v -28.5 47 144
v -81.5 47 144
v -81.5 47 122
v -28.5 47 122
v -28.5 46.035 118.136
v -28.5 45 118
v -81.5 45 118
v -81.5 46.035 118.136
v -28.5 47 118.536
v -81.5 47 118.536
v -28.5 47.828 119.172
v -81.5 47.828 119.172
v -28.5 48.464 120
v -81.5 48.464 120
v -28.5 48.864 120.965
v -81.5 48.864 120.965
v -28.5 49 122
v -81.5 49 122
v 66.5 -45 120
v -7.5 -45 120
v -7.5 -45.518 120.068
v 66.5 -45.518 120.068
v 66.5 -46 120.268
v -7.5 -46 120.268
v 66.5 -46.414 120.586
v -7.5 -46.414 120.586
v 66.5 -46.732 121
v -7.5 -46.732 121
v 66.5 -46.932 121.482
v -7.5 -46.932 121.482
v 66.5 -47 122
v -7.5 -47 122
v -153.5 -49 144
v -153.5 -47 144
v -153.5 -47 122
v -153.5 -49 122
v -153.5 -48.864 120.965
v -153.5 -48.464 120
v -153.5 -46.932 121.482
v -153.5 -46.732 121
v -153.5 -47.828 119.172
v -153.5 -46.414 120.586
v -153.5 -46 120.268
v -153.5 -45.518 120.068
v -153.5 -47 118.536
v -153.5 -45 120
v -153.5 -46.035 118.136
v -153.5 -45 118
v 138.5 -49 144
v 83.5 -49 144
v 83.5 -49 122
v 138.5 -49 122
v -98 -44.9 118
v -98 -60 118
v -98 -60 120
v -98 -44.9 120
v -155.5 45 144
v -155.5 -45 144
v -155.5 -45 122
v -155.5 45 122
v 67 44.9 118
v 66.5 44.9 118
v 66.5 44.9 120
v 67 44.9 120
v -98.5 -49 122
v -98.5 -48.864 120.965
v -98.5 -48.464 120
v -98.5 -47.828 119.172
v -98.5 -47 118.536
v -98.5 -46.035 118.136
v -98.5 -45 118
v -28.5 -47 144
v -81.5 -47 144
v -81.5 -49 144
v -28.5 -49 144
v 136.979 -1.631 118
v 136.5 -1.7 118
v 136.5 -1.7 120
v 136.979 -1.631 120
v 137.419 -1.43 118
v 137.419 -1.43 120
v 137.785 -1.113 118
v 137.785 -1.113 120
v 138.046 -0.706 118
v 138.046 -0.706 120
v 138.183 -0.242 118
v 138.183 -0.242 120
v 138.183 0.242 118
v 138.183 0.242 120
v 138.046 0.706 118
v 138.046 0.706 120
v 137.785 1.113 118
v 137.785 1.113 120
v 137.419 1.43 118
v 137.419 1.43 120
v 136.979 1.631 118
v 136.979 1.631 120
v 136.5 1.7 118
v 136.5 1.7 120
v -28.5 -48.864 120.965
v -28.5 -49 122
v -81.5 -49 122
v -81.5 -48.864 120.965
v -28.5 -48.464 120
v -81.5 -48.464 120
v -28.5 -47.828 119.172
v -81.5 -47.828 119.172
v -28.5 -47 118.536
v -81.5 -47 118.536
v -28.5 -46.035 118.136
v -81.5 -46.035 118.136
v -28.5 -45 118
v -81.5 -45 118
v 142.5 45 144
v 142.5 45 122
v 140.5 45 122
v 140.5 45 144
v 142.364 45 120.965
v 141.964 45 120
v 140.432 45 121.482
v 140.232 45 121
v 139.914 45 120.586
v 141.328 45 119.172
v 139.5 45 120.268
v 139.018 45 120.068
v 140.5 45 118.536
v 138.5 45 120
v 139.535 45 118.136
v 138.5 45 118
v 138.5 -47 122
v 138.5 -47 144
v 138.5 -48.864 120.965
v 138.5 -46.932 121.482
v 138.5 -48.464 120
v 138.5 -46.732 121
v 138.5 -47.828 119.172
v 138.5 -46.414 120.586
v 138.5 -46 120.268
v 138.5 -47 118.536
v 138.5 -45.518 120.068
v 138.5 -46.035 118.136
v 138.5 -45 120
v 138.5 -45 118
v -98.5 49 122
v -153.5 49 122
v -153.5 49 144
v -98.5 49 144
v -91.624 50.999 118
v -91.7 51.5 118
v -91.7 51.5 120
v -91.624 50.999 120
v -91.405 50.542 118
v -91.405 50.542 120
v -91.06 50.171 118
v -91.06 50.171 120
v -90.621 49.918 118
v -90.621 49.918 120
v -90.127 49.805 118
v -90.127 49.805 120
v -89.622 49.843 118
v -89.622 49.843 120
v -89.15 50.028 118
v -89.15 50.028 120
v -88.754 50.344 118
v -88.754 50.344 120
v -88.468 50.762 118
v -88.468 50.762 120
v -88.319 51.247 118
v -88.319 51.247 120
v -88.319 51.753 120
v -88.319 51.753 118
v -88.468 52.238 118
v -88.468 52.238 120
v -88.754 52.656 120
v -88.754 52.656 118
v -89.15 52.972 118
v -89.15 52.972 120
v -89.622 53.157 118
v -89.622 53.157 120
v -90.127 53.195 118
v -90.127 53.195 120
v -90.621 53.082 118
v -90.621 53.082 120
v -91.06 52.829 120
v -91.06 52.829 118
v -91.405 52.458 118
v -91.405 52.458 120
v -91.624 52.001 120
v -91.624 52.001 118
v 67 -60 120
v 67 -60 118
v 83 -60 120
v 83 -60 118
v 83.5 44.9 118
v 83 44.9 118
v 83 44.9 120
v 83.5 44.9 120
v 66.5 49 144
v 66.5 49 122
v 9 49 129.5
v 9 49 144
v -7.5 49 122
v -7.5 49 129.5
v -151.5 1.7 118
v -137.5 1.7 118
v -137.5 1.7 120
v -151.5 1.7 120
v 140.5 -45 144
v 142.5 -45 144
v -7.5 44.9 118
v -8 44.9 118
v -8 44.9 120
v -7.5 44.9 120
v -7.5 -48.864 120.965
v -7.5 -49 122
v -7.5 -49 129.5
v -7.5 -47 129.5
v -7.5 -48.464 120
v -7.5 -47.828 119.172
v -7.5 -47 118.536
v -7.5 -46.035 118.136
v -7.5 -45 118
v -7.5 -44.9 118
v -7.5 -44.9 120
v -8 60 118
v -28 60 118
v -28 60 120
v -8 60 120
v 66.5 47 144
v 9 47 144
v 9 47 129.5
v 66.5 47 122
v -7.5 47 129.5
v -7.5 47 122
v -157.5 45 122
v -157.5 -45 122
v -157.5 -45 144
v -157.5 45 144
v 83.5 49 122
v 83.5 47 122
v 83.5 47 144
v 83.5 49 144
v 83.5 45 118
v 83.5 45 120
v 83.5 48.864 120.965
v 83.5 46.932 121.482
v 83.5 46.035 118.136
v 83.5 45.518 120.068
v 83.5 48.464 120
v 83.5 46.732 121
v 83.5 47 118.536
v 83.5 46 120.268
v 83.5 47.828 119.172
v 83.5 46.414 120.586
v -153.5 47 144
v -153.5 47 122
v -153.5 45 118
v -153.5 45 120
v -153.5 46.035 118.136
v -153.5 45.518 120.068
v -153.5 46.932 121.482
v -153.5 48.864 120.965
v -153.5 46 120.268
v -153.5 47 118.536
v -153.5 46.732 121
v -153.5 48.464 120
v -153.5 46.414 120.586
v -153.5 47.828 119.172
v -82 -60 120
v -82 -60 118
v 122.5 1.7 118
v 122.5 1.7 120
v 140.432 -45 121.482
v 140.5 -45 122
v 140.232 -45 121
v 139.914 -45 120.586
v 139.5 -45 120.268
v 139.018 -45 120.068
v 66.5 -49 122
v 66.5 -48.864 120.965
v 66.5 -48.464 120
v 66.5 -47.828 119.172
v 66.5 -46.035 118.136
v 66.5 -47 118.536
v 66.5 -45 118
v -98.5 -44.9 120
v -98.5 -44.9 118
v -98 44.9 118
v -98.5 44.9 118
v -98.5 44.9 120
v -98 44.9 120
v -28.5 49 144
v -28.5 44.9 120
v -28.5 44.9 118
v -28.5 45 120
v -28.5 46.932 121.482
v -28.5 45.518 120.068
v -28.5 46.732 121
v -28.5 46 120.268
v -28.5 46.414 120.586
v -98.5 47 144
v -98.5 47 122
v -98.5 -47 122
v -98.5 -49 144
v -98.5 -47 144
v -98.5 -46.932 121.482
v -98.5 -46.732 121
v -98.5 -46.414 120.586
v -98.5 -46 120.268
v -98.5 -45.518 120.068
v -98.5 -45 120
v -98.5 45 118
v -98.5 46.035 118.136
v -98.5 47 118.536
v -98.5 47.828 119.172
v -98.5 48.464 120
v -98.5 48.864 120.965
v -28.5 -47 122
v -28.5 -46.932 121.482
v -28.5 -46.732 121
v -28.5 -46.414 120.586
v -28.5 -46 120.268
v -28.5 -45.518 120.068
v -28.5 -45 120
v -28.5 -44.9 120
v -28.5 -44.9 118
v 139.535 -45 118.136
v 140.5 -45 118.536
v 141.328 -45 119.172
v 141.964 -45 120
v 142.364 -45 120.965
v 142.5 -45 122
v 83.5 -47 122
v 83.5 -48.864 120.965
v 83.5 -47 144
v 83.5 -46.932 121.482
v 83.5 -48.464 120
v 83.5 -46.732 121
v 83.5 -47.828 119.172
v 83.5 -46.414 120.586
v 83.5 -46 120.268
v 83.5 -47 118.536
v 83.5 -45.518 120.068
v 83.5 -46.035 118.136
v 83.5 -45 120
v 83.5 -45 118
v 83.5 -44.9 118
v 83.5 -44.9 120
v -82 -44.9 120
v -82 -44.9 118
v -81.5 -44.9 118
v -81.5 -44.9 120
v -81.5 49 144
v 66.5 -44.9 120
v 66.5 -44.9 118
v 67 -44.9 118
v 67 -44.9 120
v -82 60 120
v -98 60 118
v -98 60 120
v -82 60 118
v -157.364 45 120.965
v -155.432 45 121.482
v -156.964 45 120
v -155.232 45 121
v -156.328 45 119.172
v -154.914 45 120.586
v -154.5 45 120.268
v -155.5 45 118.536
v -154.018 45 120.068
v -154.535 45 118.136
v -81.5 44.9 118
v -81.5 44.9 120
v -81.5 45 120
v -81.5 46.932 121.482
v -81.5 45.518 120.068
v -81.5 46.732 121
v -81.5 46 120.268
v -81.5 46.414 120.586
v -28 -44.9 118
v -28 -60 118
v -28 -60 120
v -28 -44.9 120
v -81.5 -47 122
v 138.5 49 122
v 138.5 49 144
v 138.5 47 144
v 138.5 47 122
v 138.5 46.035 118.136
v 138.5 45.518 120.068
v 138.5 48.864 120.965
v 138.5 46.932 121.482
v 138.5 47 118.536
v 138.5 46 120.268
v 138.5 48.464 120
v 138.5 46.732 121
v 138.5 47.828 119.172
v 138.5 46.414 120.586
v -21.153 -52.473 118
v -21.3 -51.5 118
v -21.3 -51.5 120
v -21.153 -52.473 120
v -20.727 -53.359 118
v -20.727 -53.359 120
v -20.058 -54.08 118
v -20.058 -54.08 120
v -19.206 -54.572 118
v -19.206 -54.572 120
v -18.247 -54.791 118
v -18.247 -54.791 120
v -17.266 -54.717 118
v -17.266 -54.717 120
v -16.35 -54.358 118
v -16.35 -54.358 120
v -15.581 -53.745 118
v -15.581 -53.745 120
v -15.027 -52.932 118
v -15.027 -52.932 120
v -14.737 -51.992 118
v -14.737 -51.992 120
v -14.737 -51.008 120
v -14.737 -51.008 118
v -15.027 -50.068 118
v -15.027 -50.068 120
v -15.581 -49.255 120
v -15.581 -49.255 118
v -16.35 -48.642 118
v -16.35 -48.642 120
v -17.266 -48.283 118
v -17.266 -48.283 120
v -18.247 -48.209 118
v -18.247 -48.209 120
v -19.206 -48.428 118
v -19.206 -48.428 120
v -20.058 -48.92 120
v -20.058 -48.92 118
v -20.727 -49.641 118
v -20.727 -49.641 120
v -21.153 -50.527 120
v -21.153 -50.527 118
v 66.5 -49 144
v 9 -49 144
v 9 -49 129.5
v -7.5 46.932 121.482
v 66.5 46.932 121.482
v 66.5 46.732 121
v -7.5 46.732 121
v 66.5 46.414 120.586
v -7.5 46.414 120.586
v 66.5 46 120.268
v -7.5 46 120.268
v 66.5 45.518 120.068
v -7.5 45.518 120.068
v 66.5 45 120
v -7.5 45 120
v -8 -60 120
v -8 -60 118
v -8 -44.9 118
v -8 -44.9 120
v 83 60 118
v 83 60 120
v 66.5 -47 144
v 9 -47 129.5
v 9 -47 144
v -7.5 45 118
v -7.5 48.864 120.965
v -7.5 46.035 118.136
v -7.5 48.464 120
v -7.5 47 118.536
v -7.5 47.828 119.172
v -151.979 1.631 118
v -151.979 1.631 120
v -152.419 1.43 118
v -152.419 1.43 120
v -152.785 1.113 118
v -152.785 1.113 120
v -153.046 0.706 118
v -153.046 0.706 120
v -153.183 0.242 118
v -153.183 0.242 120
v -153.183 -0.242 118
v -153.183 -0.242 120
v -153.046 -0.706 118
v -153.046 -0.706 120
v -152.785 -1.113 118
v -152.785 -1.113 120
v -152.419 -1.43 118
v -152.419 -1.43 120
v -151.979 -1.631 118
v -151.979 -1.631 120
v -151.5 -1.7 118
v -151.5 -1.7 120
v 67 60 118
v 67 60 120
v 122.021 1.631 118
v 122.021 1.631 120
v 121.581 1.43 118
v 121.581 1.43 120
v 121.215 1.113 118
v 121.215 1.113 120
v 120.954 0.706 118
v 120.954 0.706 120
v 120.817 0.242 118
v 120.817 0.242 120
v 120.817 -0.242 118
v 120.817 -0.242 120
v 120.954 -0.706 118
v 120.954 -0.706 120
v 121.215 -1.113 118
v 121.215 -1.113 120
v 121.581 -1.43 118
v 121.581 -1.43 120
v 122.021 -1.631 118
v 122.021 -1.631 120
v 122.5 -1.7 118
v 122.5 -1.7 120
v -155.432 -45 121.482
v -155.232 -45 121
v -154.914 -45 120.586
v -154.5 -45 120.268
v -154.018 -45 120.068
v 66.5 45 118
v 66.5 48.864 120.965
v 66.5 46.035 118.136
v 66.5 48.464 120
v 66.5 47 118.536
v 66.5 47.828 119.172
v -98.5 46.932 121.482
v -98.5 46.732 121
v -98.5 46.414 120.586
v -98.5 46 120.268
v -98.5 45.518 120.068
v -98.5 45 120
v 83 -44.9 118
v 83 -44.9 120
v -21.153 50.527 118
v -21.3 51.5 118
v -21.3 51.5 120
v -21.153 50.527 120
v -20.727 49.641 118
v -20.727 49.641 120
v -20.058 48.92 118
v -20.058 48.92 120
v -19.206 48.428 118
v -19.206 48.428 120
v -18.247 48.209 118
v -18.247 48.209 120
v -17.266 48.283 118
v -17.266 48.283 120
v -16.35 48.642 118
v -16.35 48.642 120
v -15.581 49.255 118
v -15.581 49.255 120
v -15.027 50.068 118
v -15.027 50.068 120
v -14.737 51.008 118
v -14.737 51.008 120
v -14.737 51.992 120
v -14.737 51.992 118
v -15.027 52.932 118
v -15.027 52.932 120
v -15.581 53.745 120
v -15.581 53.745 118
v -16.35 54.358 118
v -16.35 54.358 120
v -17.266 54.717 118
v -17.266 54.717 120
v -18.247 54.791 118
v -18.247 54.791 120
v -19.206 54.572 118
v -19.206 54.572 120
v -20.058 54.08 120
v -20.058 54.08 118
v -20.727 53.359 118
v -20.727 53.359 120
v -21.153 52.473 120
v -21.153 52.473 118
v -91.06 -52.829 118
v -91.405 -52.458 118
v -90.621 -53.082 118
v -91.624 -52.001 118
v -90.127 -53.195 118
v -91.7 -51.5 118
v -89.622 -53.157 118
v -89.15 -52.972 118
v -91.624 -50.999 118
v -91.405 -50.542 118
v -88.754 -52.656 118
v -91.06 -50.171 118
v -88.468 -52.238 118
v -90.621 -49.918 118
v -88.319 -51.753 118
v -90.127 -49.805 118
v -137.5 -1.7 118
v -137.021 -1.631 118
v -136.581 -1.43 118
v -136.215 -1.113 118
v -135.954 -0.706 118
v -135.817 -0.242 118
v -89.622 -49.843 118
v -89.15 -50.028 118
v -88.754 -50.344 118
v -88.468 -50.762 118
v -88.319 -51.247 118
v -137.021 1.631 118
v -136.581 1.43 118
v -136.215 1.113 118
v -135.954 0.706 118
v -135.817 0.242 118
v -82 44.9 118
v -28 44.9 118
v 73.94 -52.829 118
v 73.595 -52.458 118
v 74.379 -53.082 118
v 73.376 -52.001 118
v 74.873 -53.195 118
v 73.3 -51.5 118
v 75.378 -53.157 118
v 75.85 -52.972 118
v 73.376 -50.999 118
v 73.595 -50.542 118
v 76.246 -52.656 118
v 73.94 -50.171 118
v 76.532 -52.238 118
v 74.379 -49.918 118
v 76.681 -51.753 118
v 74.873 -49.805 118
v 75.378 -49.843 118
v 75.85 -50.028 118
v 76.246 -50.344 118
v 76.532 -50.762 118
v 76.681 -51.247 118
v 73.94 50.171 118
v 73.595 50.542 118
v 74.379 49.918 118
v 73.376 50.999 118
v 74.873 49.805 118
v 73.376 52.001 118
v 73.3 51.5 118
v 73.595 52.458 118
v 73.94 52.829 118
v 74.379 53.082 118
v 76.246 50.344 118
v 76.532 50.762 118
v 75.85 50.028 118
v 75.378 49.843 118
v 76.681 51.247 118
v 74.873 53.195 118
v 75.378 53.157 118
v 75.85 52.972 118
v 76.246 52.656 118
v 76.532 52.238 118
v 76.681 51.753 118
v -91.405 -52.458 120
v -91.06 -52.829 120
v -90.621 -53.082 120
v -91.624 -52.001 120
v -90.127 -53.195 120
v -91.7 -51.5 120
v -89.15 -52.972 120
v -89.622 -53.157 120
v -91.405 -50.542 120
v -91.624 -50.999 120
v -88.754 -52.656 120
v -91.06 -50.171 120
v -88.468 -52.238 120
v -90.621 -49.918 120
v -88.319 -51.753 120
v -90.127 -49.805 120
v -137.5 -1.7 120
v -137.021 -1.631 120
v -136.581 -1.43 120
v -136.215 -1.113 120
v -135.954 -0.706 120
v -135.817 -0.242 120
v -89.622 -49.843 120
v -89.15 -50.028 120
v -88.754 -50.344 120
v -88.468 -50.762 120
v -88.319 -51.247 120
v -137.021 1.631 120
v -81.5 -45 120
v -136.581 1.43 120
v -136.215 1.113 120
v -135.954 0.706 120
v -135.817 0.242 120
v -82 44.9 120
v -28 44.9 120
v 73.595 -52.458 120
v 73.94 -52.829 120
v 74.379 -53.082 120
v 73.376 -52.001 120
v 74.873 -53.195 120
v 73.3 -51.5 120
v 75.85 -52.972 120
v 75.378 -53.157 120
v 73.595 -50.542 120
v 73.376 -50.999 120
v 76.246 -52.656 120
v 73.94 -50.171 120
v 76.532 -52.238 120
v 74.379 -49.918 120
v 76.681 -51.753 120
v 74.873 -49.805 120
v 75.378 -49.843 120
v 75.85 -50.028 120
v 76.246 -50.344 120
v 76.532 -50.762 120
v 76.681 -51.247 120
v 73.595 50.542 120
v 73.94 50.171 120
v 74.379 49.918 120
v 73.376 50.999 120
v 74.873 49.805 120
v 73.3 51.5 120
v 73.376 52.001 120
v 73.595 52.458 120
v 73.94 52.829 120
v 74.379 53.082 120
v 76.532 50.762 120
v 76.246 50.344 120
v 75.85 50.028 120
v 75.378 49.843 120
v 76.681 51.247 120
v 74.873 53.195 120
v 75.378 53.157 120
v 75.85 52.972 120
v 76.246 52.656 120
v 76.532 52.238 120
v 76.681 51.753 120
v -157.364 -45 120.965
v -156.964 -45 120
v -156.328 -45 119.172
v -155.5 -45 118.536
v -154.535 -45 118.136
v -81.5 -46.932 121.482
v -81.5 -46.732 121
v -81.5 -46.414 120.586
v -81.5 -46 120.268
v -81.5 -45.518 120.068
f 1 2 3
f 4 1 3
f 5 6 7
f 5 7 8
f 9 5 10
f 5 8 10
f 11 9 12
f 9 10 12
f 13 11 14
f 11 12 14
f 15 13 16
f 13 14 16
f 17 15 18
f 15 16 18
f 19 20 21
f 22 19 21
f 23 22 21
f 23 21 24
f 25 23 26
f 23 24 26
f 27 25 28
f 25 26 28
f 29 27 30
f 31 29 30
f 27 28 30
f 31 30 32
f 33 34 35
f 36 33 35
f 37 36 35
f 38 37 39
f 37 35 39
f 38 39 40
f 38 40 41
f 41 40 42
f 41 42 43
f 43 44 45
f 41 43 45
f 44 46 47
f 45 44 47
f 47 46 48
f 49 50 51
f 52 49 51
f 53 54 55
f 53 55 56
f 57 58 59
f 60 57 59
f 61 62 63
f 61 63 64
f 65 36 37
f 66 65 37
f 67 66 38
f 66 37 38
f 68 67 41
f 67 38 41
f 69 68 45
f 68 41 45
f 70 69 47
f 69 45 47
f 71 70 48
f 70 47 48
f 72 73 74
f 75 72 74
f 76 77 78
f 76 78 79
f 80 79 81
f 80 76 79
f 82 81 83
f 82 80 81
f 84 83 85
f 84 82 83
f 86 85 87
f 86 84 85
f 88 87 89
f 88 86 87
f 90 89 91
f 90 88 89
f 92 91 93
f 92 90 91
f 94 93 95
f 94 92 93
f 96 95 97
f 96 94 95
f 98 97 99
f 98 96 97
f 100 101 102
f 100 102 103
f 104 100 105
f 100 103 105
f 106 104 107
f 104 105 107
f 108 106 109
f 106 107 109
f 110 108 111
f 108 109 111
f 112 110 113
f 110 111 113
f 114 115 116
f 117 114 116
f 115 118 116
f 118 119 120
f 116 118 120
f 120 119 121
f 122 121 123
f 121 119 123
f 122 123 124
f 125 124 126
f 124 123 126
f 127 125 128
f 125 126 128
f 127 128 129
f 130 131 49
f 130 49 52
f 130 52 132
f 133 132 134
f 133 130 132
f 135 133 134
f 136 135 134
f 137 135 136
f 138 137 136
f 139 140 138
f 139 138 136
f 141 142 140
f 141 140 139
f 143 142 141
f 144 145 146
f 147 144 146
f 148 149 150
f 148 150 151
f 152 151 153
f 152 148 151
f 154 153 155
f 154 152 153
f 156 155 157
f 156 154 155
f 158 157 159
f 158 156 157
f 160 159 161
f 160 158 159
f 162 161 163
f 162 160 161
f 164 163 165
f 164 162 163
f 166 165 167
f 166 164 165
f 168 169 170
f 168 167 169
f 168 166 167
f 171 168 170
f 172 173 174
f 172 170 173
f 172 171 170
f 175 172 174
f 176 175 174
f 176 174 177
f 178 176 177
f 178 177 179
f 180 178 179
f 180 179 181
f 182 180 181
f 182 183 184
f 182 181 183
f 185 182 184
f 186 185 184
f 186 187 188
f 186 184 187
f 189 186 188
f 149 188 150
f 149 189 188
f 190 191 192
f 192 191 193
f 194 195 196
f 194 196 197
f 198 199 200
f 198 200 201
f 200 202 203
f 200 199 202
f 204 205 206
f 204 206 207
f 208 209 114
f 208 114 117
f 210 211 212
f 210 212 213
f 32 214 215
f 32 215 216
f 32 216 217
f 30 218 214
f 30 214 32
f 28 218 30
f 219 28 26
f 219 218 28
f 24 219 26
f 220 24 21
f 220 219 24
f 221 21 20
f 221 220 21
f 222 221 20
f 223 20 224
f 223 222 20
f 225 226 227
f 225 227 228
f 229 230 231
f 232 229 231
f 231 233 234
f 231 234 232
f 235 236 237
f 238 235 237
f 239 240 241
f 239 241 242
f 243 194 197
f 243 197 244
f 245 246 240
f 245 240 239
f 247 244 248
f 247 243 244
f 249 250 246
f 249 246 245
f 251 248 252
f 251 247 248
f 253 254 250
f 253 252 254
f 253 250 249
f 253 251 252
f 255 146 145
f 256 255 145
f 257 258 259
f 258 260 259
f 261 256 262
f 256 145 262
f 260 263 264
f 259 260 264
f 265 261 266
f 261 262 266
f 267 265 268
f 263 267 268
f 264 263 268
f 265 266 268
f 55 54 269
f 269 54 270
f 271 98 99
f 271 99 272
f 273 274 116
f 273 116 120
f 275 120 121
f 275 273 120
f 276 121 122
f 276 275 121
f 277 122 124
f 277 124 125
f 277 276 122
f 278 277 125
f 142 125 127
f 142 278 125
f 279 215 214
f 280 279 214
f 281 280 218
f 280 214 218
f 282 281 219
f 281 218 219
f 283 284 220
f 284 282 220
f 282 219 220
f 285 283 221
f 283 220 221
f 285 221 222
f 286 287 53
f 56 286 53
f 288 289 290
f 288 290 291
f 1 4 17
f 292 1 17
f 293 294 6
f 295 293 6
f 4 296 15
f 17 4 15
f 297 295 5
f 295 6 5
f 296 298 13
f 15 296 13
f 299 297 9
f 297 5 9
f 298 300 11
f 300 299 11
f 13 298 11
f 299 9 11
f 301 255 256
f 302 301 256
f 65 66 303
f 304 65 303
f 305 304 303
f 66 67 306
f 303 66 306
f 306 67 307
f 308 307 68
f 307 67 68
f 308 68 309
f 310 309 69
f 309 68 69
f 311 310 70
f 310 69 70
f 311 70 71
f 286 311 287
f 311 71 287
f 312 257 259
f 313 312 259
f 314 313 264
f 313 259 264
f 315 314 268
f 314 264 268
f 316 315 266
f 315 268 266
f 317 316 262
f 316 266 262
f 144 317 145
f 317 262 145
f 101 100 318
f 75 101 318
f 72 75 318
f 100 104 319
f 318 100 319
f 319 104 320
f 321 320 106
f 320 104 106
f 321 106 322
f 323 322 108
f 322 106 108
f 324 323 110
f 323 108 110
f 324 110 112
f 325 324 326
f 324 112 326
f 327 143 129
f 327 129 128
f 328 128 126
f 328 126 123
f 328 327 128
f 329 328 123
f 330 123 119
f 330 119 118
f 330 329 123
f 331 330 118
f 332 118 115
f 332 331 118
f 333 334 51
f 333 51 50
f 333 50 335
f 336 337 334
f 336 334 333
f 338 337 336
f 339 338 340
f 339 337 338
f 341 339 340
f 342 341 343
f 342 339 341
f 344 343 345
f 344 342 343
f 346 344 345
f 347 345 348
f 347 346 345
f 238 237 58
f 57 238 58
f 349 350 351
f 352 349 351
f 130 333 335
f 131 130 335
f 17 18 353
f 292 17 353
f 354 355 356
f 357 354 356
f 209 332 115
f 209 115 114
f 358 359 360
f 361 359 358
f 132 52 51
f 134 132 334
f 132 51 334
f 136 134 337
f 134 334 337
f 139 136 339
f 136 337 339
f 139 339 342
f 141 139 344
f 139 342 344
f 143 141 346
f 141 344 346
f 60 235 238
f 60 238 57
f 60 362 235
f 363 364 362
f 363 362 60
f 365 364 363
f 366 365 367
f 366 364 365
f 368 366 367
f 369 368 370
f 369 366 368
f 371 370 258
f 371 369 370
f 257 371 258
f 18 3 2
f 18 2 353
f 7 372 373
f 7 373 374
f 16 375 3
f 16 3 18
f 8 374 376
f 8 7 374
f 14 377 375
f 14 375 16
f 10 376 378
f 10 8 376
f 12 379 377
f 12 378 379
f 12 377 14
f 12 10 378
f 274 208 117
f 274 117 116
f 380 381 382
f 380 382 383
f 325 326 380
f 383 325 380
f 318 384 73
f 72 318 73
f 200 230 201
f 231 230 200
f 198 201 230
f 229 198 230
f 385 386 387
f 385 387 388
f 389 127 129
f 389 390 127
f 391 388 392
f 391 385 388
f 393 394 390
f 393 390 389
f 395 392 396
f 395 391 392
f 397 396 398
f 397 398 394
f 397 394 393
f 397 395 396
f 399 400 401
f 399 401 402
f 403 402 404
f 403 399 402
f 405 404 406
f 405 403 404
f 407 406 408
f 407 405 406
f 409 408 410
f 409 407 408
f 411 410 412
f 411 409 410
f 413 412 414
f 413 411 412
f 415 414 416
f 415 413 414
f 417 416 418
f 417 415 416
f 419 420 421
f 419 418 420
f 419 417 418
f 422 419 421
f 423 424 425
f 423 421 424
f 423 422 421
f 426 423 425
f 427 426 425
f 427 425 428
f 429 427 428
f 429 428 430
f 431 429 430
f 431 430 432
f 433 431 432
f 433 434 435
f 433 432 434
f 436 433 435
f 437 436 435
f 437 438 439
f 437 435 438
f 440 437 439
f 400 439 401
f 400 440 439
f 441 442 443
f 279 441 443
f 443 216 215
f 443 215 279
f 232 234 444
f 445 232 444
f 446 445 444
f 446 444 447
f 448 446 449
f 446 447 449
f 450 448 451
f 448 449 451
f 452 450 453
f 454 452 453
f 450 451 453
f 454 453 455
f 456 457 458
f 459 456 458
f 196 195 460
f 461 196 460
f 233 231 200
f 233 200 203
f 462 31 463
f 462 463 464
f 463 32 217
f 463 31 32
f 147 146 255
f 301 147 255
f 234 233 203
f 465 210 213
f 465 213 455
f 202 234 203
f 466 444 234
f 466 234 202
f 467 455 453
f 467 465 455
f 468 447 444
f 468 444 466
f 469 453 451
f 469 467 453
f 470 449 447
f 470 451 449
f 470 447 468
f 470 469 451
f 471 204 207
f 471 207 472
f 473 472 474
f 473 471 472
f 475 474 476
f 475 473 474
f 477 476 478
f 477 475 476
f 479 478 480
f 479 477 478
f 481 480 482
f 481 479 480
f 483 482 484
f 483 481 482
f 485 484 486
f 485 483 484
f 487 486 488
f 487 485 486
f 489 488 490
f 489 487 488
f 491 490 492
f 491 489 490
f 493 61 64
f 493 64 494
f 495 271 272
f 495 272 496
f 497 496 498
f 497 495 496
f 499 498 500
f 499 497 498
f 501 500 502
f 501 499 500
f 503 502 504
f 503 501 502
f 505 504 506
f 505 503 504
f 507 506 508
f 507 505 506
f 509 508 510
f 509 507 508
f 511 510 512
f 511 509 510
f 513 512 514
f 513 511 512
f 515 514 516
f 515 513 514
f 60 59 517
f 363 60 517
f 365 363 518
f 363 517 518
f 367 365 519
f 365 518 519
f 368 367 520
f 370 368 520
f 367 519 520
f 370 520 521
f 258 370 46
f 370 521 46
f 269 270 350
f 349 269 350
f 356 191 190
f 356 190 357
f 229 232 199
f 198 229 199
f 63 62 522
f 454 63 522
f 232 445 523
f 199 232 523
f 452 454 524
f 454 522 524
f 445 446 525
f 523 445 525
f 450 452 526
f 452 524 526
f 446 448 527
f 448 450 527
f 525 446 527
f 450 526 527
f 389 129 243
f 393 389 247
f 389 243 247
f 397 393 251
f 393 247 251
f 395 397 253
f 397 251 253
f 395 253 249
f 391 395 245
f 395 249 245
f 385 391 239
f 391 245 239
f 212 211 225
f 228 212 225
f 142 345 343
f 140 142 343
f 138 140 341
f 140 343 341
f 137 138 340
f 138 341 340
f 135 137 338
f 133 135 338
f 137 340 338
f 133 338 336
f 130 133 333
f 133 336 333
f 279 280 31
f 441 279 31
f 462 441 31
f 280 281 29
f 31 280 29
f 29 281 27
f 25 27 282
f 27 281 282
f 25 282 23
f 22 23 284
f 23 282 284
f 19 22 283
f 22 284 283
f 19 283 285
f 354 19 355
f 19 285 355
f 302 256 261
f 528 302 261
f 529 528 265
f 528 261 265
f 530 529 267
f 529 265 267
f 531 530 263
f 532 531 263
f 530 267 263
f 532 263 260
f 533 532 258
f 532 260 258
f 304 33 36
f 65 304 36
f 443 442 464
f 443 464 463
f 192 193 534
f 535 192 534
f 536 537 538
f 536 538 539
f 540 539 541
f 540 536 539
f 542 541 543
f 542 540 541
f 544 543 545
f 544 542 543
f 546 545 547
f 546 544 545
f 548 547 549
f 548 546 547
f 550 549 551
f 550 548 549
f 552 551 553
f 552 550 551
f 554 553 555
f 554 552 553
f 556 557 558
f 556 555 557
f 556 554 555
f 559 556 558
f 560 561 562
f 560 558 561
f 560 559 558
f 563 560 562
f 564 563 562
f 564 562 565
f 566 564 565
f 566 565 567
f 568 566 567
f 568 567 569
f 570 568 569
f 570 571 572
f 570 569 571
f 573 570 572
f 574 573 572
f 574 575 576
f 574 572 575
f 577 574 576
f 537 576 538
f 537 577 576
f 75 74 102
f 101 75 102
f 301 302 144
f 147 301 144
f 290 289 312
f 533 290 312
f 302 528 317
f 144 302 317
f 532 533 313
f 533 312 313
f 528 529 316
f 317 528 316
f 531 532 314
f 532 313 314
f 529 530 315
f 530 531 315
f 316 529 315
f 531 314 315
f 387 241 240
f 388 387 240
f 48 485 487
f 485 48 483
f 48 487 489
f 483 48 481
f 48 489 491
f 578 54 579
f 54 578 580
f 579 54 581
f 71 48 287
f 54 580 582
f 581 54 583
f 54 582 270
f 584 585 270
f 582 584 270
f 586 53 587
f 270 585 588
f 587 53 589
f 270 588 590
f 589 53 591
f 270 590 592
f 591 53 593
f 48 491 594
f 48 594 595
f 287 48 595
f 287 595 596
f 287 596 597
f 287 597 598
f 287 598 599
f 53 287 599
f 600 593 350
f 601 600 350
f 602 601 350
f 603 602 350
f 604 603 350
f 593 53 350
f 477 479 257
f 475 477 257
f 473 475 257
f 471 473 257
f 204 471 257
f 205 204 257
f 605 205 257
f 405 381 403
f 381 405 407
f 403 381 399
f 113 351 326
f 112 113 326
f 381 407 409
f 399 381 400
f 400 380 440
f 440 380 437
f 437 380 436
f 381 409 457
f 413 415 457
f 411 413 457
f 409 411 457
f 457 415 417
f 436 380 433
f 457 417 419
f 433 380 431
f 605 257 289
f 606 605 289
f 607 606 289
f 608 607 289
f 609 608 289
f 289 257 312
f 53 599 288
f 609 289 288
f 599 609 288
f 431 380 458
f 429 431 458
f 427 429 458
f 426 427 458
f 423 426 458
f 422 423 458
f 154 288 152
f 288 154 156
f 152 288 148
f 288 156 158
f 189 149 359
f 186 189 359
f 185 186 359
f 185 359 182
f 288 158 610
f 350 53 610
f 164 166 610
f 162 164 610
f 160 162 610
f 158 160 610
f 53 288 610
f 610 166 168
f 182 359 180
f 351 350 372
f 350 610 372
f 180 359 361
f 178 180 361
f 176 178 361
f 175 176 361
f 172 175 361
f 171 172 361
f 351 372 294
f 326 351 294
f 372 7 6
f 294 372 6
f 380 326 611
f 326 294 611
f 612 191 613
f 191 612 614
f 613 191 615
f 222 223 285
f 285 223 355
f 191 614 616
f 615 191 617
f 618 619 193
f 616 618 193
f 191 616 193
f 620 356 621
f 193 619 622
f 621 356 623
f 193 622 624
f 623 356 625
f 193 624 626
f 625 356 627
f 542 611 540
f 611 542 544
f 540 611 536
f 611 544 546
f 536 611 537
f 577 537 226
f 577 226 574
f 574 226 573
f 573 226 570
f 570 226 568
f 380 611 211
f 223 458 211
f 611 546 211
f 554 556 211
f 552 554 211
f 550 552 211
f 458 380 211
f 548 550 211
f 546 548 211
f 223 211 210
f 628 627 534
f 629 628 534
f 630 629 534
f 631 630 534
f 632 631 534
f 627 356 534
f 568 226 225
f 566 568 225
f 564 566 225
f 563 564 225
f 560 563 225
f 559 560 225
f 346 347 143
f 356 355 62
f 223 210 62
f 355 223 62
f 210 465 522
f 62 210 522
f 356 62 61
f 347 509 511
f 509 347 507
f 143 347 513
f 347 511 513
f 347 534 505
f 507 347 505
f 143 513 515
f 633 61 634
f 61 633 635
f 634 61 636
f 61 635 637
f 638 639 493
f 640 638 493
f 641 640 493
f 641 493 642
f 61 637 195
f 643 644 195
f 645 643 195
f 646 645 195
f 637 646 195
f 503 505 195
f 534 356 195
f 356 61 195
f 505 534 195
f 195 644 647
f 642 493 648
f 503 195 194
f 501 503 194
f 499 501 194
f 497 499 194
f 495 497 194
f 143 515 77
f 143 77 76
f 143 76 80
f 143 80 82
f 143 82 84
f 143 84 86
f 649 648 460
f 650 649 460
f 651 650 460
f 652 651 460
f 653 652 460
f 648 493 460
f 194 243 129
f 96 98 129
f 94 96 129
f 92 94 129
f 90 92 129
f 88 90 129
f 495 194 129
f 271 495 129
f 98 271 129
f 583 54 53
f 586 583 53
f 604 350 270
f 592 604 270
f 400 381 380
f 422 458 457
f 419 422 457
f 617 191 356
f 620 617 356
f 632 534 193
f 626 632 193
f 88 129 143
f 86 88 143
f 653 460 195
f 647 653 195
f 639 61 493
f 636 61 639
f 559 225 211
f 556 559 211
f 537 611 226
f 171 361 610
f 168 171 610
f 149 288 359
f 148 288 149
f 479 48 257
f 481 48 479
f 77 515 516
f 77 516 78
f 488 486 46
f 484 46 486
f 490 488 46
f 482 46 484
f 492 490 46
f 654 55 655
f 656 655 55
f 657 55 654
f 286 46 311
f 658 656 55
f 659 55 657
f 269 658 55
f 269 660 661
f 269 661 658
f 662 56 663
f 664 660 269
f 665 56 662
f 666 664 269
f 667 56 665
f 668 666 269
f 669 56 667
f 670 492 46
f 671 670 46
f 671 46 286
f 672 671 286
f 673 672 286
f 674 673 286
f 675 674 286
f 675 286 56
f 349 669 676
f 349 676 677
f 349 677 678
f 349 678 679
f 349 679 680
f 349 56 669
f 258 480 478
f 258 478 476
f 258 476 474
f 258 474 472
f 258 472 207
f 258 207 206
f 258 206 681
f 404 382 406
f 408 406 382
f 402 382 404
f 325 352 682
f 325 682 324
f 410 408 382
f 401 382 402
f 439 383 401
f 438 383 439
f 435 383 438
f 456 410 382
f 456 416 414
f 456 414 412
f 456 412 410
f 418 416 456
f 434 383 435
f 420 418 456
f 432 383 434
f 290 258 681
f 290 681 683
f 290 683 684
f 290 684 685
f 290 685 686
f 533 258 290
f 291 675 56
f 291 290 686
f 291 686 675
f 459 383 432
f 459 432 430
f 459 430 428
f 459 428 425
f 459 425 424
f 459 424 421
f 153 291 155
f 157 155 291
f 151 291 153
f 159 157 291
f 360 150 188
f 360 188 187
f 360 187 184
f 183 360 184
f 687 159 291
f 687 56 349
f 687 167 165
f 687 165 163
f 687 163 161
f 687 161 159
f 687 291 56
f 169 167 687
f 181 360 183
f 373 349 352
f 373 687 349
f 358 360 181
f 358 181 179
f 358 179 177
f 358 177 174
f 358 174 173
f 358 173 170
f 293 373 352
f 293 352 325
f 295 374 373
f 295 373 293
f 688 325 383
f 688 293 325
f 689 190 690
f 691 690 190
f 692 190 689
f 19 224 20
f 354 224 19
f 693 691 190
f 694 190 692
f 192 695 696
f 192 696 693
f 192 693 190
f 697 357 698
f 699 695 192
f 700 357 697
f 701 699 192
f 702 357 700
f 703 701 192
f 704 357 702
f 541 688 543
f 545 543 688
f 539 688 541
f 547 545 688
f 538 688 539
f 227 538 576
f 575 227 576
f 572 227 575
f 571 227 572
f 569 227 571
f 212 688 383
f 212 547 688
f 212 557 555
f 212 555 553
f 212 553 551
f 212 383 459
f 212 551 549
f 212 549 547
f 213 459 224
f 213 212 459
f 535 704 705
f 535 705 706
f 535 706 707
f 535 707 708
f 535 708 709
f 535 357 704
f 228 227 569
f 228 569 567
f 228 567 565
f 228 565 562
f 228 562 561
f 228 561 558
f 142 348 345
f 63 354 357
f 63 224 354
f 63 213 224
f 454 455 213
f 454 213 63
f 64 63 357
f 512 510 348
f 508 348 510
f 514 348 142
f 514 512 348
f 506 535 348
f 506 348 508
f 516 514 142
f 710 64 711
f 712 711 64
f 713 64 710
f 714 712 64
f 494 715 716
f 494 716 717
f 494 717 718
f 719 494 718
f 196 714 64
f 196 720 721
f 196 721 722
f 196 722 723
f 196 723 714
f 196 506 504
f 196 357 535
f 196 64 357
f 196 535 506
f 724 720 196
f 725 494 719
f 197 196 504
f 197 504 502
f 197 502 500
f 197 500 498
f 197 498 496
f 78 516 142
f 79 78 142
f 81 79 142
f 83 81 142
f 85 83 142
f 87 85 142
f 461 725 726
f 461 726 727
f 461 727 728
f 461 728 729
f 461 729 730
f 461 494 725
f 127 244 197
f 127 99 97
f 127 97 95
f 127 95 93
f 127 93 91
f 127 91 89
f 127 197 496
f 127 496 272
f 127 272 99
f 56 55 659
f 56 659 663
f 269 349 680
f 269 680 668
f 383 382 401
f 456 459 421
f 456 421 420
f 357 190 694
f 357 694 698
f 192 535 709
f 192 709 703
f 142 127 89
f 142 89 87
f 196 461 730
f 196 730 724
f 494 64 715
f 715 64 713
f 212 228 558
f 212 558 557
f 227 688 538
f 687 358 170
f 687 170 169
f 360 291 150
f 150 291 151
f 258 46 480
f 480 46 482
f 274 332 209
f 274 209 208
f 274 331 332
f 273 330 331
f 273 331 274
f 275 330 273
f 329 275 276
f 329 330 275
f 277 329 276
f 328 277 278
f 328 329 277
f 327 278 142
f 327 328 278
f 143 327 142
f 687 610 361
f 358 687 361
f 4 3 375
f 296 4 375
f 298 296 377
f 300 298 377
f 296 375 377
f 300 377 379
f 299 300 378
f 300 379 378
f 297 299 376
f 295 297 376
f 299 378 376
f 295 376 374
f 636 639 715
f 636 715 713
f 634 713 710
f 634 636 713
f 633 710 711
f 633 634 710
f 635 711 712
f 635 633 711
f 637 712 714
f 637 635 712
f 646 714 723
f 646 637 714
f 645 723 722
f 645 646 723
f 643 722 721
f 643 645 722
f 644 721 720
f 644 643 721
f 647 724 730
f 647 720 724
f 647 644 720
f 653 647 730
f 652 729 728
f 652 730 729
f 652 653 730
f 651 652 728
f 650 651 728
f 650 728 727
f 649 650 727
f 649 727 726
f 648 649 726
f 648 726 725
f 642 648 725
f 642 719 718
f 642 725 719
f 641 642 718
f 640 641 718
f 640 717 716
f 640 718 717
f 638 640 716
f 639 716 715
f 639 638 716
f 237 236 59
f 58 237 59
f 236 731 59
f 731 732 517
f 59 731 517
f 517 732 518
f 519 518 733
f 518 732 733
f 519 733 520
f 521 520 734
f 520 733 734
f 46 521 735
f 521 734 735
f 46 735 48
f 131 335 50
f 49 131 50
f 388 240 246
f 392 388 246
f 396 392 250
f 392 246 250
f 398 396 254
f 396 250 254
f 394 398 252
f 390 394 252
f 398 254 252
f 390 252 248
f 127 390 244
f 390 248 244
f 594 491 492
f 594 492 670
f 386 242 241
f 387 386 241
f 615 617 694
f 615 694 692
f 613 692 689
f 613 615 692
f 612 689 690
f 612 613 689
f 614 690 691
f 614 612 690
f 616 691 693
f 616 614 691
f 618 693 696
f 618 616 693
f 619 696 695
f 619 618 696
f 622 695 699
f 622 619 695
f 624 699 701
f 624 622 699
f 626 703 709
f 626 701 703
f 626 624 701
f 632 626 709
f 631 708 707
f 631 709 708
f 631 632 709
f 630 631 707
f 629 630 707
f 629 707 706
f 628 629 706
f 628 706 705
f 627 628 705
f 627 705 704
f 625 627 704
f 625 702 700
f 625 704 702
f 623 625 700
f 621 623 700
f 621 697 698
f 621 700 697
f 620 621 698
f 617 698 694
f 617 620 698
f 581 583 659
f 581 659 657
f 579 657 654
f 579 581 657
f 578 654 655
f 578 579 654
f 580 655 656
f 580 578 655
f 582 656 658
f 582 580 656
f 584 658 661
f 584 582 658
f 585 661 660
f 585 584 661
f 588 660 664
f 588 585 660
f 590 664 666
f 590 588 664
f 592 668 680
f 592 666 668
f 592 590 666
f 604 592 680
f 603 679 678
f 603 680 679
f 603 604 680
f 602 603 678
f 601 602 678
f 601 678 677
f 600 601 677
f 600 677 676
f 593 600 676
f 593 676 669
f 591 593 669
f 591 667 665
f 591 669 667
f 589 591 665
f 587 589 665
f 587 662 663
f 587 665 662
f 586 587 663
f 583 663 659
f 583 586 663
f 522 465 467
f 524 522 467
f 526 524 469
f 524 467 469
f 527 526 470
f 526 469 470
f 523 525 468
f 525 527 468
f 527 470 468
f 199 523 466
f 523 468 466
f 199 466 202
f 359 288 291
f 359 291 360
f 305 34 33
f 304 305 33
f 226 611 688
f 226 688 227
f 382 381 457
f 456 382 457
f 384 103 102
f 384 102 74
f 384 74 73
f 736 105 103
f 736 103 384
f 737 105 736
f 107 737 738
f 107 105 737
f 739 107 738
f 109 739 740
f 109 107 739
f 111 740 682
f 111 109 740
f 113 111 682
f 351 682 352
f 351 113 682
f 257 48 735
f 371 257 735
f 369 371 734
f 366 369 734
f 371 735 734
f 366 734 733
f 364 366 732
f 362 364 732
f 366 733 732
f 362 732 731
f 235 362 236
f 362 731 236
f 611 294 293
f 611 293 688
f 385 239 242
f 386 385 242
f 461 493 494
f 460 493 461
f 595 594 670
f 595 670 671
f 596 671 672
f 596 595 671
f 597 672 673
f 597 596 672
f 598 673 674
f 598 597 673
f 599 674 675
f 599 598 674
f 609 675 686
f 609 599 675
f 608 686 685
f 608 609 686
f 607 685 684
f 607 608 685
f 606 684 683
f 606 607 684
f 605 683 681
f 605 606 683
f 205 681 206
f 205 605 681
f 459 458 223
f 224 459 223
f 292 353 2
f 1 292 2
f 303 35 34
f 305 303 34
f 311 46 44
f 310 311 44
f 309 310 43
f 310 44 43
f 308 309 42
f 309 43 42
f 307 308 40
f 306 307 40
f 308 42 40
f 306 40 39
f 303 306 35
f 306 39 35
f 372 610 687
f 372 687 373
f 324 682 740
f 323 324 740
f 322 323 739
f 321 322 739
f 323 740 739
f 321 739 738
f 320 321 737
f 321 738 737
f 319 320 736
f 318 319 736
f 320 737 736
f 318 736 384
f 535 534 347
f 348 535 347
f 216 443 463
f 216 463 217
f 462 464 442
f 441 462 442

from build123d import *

# Parameters (mm, degrees)
TRAY_SECTION_DEPTH         = 292
REAR_WALL_DEPTH            = 90
FRONT_WALL_DEPTH           = 90
EAR_RELIEF_SKETCH_W        = 17
EAR_RELIEF_SKETCH_H        = 4.3
EAR_RELIEF_SKETCH_W_2      = 21
EAR_RELIEFS_DEPTH          = 26.4
MOUNTING_EAR_SKETCH_W      = 16
MOUNTING_EAR_SKETCH_H      = 15.2
MOUNTING_EAR_SKETCH_W_2    = 20
MOUNTING_EARS_DEPTH        = 2
TRAY_HOLE_SKETCH_R         = 1.7
TRAY_HOLE_SKETCH_R_2       = 3.3
TRAY_HOLES_AND_SLOTS_DEPTH = 2.4
CLAMP_CLEARANCE_SKETCH_W   = 33
CLAMP_CLEARANCE_SKETCH_H   = 14.7
CLAMP_CLEARANCE_DEPTH      = 130


with BuildPart() as part:
    # Tray Section Sketch → Tray Section (new body)
    with BuildSketch(Plane(origin=(-153.5, 0, 0), x_dir=(0, 0, -1), z_dir=(1, 0, 0))):
        with BuildLine():
            Line((-144, -49), (-122, -49))
            ThreePointArc((-122, -49), (-119.171572875, -47.828427125), (-118, -45))
            Line((-118, -45), (-118, 45))
            ThreePointArc((-118, 45), (-119.171572875, 47.828427125), (-122, 49))
            Line((-122, 49), (-144, 49))
            Line((-144, 49), (-144, 47))
            Line((-144, 47), (-122, 47))
            ThreePointArc((-122, 47), (-120.585786438, 46.414213562), (-120, 45))
            Line((-120, 45), (-120, -45))
            ThreePointArc((-120, -45), (-120.585786438, -46.414213562), (-122, -47))
            Line((-122, -47), (-144, -47))
            Line((-144, -47), (-144, -49))
        make_face()
    extrude(amount=TRAY_SECTION_DEPTH)

    # Rear Wall Sketch → Rear Wall (add)
    with BuildSketch(Plane(origin=(0, -45, 0), x_dir=(-1, 0, 0), z_dir=(0, -1, 0))):
        with BuildLine():
            Line((157.5, -122), (157.5, -144))
            Line((157.5, -144), (155.5, -144))
            Line((155.5, -144), (155.5, -122))
            ThreePointArc((155.5, -122), (154.914213562, -120.585786438), (153.5, -120))
            Line((153.5, -120), (153.5, -118))
            ThreePointArc((153.5, -118), (156.328427125, -119.171572875), (157.5, -122))
        make_face()
    extrude(amount=-REAR_WALL_DEPTH)

    # Front Wall Sketch → Front Wall (add)
    with BuildSketch(Plane(origin=(0, -45, 0), x_dir=(-1, 0, 0), z_dir=(0, -1, 0))):
        with BuildLine():
            Line((-142.5, -122), (-142.5, -144))
            Line((-142.5, -144), (-140.5, -144))
            Line((-140.5, -144), (-140.5, -122))
            ThreePointArc((-140.5, -122), (-139.914213562, -120.585786438), (-138.5, -120))
            Line((-138.5, -120), (-138.5, -118))
            ThreePointArc((-138.5, -118), (-141.328427125, -119.171572875), (-142.5, -122))
        make_face()
    extrude(amount=-FRONT_WALL_DEPTH)

    # Ear Relief Sketch → Ear Reliefs (cut)
    with BuildSketch(Plane.XY.offset(117.8)):
        with Locations((-90, -47.05)):
            Rectangle(EAR_RELIEF_SKETCH_W, EAR_RELIEF_SKETCH_H)
        with Locations((-90, 47.05)):
            Rectangle(EAR_RELIEF_SKETCH_W, EAR_RELIEF_SKETCH_H)
        with Locations((75, -47.05)):
            Rectangle(EAR_RELIEF_SKETCH_W, EAR_RELIEF_SKETCH_H)
        with Locations((75, 47.05)):
            Rectangle(EAR_RELIEF_SKETCH_W, EAR_RELIEF_SKETCH_H)
        with Locations((-18, -47.05)):
            Rectangle(EAR_RELIEF_SKETCH_W_2, EAR_RELIEF_SKETCH_H)
        with Locations((-18, 47.05)):
            Rectangle(EAR_RELIEF_SKETCH_W_2, EAR_RELIEF_SKETCH_H)
    extrude(amount=EAR_RELIEFS_DEPTH, mode=Mode.SUBTRACT)

    # Mounting Ear Sketch → Mounting Ears (add)
    with BuildSketch(Plane.XY.offset(118)):
        with Locations((-90, -52.4)):
            Rectangle(MOUNTING_EAR_SKETCH_W, MOUNTING_EAR_SKETCH_H)
        with Locations((-90, 52.4)):
            Rectangle(MOUNTING_EAR_SKETCH_W, MOUNTING_EAR_SKETCH_H)
        with Locations((75, -52.4)):
            Rectangle(MOUNTING_EAR_SKETCH_W, MOUNTING_EAR_SKETCH_H)
        with Locations((75, 52.4)):
            Rectangle(MOUNTING_EAR_SKETCH_W, MOUNTING_EAR_SKETCH_H)
        with Locations((-18, -52.4)):
            Rectangle(MOUNTING_EAR_SKETCH_W_2, MOUNTING_EAR_SKETCH_H)
        with Locations((-18, 52.4)):
            Rectangle(MOUNTING_EAR_SKETCH_W_2, MOUNTING_EAR_SKETCH_H)
    extrude(amount=MOUNTING_EARS_DEPTH)

    # Tray Hole Sketch → Tray Holes and Slots (cut)
    with BuildSketch(Plane.XY.offset(117.8)):
        with Locations(Location((-90, -51.5, 0), (0, 0, 180))):
            Circle(TRAY_HOLE_SKETCH_R)
        with Locations(Location((-90, 51.5, 0), (0, 0, 180))):
            Circle(TRAY_HOLE_SKETCH_R)
        with Locations(Location((75, -51.5, 0), (0, 0, 180))):
            Circle(TRAY_HOLE_SKETCH_R)
        with Locations(Location((75, 51.5, 0), (0, 0, 180))):
            Circle(TRAY_HOLE_SKETCH_R)
        with Locations(Location((-18, -51.5, 0), (0, 0, 180))):
            Circle(TRAY_HOLE_SKETCH_R_2)
        with Locations(Location((-18, 51.5, 0), (0, 0, 180))):
            Circle(TRAY_HOLE_SKETCH_R_2)
        with BuildLine():
            Line((-151.5, -1.7), (-137.5, -1.7))
            ThreePointArc((-137.5, -1.7), (-135.8, 0), (-137.5, 1.7))
            Line((-137.5, 1.7), (-151.5, 1.7))
            ThreePointArc((-151.5, 1.7), (-153.2, 0), (-151.5, -1.7))
        make_face()
        with BuildLine():
            Line((122.5, -1.7), (136.5, -1.7))
            ThreePointArc((136.5, -1.7), (138.2, 0), (136.5, 1.7))
            Line((136.5, 1.7), (122.5, 1.7))
            ThreePointArc((122.5, 1.7), (120.8, 0), (122.5, -1.7))
        make_face()
    extrude(amount=TRAY_HOLES_AND_SLOTS_DEPTH, mode=Mode.SUBTRACT)

    # Clamp Clearance Sketch → Clamp Clearance (cut)
    with BuildSketch(Plane(origin=(0, -65, 0), x_dir=(-1, 0, 0), z_dir=(0, -1, 0))):
        with Locations((7.5, -136.85)):
            Rectangle(CLAMP_CLEARANCE_SKETCH_W, CLAMP_CLEARANCE_SKETCH_H)
    extrude(amount=-CLAMP_CLEARANCE_DEPTH, mode=Mode.SUBTRACT)


solid = part.part
